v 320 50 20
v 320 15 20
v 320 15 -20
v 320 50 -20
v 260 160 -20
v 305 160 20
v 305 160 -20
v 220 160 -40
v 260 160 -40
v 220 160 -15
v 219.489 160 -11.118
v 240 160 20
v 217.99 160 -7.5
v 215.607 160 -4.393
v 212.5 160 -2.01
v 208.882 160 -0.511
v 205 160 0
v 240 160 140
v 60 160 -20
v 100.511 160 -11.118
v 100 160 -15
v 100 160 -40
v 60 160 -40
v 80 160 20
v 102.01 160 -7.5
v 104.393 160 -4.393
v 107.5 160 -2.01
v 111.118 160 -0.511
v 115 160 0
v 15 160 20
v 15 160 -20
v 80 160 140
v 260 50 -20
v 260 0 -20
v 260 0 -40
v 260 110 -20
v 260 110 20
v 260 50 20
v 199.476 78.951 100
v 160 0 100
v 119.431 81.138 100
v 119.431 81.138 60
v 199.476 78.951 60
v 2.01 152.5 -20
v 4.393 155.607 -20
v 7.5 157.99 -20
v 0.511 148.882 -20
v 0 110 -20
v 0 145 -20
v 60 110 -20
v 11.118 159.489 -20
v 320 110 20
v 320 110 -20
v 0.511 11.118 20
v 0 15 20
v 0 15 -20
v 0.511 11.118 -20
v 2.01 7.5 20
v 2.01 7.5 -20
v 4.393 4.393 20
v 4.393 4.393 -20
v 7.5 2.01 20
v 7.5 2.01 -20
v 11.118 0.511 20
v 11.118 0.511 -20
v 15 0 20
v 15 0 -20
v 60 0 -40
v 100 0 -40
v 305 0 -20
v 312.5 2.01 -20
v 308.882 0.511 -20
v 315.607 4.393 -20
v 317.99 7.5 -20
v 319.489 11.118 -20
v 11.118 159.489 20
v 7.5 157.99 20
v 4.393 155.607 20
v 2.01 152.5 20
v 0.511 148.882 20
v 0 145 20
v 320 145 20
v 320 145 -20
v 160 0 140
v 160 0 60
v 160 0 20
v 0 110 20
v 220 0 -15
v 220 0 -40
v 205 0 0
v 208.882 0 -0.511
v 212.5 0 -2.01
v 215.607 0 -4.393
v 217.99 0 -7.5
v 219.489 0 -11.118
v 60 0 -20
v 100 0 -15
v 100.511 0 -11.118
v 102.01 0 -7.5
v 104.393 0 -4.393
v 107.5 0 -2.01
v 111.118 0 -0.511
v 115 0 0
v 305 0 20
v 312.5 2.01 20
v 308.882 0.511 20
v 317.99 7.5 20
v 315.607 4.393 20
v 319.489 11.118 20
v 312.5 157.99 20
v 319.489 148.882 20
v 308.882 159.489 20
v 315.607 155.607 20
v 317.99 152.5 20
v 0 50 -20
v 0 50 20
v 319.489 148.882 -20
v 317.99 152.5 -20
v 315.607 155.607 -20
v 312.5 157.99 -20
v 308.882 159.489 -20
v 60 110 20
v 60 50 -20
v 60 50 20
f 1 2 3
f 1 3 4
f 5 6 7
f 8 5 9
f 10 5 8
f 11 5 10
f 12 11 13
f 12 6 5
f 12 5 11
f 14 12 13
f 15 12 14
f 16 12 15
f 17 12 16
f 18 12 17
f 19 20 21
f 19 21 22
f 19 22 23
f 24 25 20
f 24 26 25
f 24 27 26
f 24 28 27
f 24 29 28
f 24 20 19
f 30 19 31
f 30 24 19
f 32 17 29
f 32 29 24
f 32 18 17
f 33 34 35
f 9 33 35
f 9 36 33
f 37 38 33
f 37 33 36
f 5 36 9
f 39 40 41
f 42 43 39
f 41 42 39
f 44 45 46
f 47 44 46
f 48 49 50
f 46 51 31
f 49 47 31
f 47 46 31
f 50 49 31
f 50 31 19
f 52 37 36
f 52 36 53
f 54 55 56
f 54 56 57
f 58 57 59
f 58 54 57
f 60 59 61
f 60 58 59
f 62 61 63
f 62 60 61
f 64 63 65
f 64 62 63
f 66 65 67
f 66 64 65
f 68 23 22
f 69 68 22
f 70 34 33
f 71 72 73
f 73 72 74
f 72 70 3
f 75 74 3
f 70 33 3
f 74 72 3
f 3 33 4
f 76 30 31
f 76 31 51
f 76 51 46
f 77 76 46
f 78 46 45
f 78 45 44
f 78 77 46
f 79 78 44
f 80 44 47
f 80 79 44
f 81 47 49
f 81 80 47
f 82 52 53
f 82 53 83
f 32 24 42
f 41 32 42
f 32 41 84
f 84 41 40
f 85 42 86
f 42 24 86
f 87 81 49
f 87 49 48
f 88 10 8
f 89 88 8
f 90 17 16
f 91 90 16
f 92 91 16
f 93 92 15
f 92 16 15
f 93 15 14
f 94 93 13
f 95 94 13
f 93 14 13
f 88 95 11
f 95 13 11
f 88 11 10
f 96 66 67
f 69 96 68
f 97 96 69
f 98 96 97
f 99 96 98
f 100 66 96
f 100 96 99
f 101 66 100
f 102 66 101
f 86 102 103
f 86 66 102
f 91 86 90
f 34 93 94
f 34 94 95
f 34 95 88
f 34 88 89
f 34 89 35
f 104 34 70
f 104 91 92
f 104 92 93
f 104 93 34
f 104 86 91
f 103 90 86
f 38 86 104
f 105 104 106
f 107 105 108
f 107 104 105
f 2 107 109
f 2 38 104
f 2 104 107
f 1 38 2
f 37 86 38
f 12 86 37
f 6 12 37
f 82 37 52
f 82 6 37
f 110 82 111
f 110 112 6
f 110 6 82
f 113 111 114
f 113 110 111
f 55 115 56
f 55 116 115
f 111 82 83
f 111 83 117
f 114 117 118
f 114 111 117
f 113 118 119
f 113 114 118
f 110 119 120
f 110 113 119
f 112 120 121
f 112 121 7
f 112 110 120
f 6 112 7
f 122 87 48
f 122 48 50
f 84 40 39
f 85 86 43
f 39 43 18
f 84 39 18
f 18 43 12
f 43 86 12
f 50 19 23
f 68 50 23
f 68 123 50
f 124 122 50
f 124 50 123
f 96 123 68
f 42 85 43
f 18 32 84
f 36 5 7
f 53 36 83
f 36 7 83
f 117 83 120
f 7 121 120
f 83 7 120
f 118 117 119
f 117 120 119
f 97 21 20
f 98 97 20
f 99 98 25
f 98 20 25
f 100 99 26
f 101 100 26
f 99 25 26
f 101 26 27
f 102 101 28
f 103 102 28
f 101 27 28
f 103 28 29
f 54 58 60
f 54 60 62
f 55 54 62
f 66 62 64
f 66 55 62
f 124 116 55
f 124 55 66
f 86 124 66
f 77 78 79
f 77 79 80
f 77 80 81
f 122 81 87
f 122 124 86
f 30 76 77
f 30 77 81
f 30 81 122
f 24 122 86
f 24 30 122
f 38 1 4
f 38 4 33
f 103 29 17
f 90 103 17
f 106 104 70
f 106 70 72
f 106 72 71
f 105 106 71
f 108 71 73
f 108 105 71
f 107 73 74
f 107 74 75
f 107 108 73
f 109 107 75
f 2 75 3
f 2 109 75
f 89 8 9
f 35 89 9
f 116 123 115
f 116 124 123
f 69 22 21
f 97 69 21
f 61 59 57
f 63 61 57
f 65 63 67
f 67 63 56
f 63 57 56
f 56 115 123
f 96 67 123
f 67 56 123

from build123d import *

# Parameters (mm, degrees)
F1_DEPTH       = 20
F3_DEPTH       = 120
F5_DEPTH       = 40
F7_DEPTH       = 160.001
F9_W           = 80
F9_H           = 40
F10_DEPTH      = 159.941314
F10_DEPTH_BACK = 164.311218


with BuildPart() as f1:
    # F0 (on Top) → F1 (new body, symmetric)
    with BuildSketch(Plane.XY):
        with BuildLine():
            Line((0, 50), (0, 15))
            ThreePointArc((0, 15), (4.393398, 4.393398), (15, 0))
            Line((15, 0), (305, 0))
            ThreePointArc((305, 0), (315.606602, 4.393398), (320, 15))
            Line((320, 15), (320, 50))
            Line((320, 50), (260, 50))
            Line((260, 50), (260, 110))
            Line((260, 110), (320, 110))
            Line((320, 110), (320, 145))
            ThreePointArc((320, 145), (315.606602, 155.606602), (305, 160))
            Line((305, 160), (240, 160))
            Line((240, 160), (80, 160))
            Line((80, 160), (15, 160))
            ThreePointArc((15, 160), (4.393398, 155.606602), (0, 145))
            Line((0, 145), (0, 110))
            Line((0, 110), (60, 110))
            Line((60, 110), (60, 50))
            Line((60, 50), (0, 50))
        make_face()
    extrude(amount=F1_DEPTH, both=True)

    # F2 (on face) → F3 (join)
    with BuildSketch(Plane.XY.offset(20)):
        Polygon((240, 160), (160, 160), (80, 160), (160, 0), align=None)
    extrude(amount=F3_DEPTH)

    # F4 (on face) → F5 (join)
    with BuildSketch(Plane.XY):
        Polygon((60, 50), (60, 0), (260, 0), (260, 50), (260, 110), (260, 160), (240, 160), (80, 160), (60, 160), (60, 110), align=None)
    extrude(amount=-F5_DEPTH)

    # F6 (on face) → F7 (cut, through all)
    with BuildSketch(Plane(origin=(0, 160, 0), x_dir=(-1, 0, 0), z_dir=(0, 1, 0))):
        with BuildLine():
            Line((-220, -40), (-100, -40))
            Line((-100, -40), (-100, -15))
            ThreePointArc((-100, -15), (-104.393398, -4.393398), (-115, 0))
            Line((-115, 0), (-205, 0))
            ThreePointArc((-205, 0), (-215.606602, -4.393398), (-220, -15))
            Line((-220, -15), (-220, -40))
        make_face()
    extrude(amount=-F7_DEPTH, mode=Mode.SUBTRACT)

    # F9 (on face) → F10 (cut, two sides)
    with BuildSketch(Plane(origin=(159.88065, -4.368274, 0), x_dir=(0.027312, 0.999627, 0), z_dir=(0.999627, -0.027312, 0))) as f10_sk:
        with Locations((44.369904, 80)):
            Rectangle(F9_W, F9_H)
    extrude(amount=F10_DEPTH, mode=Mode.SUBTRACT)
    extrude(f10_sk.sketch, amount=-F10_DEPTH_BACK, mode=Mode.SUBTRACT)


solid = f1.part
